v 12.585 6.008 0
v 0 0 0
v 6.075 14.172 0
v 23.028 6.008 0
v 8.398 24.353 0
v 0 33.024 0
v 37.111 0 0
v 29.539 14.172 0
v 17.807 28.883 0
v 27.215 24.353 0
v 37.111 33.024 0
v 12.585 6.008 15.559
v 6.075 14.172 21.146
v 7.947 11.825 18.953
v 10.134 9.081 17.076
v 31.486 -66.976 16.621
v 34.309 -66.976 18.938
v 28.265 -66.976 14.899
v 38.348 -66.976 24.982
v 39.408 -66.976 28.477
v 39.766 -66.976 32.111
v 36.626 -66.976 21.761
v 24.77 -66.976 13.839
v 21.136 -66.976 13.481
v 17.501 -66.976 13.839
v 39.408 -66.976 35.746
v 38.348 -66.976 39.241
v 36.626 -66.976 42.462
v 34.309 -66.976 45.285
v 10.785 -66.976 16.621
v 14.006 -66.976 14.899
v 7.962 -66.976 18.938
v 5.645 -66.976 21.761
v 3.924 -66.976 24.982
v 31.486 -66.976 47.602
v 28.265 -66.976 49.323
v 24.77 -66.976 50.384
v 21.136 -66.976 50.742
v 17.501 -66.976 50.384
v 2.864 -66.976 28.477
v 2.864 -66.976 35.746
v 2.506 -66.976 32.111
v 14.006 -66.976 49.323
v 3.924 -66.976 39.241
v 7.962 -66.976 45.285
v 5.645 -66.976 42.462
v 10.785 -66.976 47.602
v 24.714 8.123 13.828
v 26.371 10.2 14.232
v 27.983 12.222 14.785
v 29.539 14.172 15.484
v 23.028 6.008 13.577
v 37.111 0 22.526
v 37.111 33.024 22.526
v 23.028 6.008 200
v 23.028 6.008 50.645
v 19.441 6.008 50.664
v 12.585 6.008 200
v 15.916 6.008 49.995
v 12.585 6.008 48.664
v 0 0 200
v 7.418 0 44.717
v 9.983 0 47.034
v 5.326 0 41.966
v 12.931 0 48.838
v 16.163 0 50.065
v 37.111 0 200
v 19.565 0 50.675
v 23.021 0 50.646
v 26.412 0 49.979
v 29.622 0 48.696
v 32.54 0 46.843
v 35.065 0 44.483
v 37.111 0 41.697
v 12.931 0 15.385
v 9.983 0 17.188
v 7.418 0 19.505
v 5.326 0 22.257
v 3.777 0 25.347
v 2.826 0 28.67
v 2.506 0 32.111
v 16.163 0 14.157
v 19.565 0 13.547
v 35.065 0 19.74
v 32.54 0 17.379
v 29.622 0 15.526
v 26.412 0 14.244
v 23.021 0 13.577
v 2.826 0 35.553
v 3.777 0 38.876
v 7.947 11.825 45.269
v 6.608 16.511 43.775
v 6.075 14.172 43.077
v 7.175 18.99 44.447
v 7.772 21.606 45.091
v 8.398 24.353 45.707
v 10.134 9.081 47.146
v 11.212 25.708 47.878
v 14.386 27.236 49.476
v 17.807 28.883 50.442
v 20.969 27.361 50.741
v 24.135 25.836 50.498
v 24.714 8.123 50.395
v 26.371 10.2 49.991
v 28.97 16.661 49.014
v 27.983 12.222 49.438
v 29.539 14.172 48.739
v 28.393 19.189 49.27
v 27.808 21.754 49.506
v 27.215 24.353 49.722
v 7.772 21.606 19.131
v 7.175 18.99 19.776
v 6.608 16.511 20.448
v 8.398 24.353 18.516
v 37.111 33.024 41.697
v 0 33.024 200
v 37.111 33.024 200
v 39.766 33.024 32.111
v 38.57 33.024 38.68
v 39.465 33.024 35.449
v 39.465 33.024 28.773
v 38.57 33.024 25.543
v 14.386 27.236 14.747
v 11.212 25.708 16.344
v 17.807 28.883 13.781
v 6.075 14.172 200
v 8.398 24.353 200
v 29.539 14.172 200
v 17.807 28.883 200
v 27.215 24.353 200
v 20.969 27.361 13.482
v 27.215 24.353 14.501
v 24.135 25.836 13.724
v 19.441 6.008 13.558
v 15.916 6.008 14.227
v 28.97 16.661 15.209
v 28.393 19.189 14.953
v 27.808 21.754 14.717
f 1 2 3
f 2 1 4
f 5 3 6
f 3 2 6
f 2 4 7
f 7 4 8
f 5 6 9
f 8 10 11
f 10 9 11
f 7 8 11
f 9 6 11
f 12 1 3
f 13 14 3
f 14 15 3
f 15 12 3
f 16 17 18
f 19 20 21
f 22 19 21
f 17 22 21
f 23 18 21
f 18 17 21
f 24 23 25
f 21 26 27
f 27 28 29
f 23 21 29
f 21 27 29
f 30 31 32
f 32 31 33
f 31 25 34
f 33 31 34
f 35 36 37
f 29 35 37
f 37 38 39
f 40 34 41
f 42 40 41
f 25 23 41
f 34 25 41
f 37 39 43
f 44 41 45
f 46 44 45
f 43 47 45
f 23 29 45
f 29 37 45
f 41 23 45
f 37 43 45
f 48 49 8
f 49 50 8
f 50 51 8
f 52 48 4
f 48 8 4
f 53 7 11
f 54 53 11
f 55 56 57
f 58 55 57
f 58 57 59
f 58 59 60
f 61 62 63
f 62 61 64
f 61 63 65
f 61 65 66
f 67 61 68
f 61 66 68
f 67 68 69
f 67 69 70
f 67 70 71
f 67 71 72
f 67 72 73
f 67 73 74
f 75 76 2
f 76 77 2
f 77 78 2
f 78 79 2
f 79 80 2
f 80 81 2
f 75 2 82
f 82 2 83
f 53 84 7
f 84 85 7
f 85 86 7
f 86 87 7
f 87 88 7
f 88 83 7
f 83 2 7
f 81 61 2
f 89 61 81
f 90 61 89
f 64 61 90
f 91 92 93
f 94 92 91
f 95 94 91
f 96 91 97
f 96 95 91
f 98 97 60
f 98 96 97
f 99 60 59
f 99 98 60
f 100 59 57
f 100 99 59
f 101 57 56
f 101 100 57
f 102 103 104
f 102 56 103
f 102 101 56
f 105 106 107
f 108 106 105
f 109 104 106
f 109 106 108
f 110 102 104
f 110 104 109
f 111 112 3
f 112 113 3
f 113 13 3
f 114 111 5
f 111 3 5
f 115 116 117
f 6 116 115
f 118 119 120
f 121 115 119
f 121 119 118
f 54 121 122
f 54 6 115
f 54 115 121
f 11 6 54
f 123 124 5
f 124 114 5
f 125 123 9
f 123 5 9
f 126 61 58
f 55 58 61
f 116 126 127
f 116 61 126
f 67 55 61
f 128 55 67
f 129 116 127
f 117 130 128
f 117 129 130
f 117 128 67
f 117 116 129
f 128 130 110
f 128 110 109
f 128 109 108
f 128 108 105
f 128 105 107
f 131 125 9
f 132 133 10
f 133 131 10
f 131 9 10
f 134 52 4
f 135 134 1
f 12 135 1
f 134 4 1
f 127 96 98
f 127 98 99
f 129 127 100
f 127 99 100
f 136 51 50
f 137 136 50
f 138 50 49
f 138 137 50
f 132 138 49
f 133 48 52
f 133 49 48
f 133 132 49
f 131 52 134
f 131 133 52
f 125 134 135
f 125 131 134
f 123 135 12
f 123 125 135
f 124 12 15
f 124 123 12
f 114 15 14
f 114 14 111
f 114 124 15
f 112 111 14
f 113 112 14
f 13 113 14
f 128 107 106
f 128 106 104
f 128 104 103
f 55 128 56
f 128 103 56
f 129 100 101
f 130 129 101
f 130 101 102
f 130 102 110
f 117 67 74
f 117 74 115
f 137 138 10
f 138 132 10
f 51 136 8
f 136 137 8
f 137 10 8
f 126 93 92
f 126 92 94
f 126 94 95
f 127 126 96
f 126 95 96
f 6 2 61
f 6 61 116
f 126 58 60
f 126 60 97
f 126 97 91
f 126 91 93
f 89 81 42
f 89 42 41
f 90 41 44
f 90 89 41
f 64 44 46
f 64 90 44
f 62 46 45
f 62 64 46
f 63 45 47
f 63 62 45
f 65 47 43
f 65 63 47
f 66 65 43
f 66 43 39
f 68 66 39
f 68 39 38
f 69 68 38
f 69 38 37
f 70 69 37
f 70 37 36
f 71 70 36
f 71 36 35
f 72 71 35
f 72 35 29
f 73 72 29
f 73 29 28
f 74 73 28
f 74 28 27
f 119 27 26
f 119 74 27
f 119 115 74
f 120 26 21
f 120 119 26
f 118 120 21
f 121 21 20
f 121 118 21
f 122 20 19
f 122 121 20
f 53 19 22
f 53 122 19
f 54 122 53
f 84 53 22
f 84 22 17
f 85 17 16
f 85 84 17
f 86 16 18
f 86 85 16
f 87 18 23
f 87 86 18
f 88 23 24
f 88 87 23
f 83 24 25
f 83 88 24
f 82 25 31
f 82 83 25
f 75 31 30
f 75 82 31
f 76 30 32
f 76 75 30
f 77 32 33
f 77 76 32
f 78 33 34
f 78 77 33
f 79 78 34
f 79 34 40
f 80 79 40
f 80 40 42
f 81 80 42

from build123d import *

# Parameters (mm, degrees)
F0_W     = 37.110798
F0_H     = 33.024196
F1_DEPTH = 200
F2_R     = 18.630211
F3_DEPTH = 100


with BuildPart() as f1:
    # F0 (on Top) → F1 (new body)
    with BuildSketch(Plane.XY):
        with Locations((18.555399, 16.512098)):
            Rectangle(F0_W, F0_H)
        Polygon((29.538543, 14.172093), (23.027837, 6.007926), (12.585476, 6.007926), (6.07477, 14.172093), (8.398414, 24.352643), (17.806657, 28.883413), (27.214899, 24.352643), align=None, mode=Mode.SUBTRACT)
    extrude(amount=F1_DEPTH)

    # F2 (on face) → F3 (join)
    with BuildSketch(Plane(origin=(0, 33.024196, 0), x_dir=(-1, 0, 0), z_dir=(0, 1, 0))):
        with Locations((-21.135863, 32.111328)):
            Circle(F2_R)
    extrude(amount=-F3_DEPTH)


solid = f1.part
